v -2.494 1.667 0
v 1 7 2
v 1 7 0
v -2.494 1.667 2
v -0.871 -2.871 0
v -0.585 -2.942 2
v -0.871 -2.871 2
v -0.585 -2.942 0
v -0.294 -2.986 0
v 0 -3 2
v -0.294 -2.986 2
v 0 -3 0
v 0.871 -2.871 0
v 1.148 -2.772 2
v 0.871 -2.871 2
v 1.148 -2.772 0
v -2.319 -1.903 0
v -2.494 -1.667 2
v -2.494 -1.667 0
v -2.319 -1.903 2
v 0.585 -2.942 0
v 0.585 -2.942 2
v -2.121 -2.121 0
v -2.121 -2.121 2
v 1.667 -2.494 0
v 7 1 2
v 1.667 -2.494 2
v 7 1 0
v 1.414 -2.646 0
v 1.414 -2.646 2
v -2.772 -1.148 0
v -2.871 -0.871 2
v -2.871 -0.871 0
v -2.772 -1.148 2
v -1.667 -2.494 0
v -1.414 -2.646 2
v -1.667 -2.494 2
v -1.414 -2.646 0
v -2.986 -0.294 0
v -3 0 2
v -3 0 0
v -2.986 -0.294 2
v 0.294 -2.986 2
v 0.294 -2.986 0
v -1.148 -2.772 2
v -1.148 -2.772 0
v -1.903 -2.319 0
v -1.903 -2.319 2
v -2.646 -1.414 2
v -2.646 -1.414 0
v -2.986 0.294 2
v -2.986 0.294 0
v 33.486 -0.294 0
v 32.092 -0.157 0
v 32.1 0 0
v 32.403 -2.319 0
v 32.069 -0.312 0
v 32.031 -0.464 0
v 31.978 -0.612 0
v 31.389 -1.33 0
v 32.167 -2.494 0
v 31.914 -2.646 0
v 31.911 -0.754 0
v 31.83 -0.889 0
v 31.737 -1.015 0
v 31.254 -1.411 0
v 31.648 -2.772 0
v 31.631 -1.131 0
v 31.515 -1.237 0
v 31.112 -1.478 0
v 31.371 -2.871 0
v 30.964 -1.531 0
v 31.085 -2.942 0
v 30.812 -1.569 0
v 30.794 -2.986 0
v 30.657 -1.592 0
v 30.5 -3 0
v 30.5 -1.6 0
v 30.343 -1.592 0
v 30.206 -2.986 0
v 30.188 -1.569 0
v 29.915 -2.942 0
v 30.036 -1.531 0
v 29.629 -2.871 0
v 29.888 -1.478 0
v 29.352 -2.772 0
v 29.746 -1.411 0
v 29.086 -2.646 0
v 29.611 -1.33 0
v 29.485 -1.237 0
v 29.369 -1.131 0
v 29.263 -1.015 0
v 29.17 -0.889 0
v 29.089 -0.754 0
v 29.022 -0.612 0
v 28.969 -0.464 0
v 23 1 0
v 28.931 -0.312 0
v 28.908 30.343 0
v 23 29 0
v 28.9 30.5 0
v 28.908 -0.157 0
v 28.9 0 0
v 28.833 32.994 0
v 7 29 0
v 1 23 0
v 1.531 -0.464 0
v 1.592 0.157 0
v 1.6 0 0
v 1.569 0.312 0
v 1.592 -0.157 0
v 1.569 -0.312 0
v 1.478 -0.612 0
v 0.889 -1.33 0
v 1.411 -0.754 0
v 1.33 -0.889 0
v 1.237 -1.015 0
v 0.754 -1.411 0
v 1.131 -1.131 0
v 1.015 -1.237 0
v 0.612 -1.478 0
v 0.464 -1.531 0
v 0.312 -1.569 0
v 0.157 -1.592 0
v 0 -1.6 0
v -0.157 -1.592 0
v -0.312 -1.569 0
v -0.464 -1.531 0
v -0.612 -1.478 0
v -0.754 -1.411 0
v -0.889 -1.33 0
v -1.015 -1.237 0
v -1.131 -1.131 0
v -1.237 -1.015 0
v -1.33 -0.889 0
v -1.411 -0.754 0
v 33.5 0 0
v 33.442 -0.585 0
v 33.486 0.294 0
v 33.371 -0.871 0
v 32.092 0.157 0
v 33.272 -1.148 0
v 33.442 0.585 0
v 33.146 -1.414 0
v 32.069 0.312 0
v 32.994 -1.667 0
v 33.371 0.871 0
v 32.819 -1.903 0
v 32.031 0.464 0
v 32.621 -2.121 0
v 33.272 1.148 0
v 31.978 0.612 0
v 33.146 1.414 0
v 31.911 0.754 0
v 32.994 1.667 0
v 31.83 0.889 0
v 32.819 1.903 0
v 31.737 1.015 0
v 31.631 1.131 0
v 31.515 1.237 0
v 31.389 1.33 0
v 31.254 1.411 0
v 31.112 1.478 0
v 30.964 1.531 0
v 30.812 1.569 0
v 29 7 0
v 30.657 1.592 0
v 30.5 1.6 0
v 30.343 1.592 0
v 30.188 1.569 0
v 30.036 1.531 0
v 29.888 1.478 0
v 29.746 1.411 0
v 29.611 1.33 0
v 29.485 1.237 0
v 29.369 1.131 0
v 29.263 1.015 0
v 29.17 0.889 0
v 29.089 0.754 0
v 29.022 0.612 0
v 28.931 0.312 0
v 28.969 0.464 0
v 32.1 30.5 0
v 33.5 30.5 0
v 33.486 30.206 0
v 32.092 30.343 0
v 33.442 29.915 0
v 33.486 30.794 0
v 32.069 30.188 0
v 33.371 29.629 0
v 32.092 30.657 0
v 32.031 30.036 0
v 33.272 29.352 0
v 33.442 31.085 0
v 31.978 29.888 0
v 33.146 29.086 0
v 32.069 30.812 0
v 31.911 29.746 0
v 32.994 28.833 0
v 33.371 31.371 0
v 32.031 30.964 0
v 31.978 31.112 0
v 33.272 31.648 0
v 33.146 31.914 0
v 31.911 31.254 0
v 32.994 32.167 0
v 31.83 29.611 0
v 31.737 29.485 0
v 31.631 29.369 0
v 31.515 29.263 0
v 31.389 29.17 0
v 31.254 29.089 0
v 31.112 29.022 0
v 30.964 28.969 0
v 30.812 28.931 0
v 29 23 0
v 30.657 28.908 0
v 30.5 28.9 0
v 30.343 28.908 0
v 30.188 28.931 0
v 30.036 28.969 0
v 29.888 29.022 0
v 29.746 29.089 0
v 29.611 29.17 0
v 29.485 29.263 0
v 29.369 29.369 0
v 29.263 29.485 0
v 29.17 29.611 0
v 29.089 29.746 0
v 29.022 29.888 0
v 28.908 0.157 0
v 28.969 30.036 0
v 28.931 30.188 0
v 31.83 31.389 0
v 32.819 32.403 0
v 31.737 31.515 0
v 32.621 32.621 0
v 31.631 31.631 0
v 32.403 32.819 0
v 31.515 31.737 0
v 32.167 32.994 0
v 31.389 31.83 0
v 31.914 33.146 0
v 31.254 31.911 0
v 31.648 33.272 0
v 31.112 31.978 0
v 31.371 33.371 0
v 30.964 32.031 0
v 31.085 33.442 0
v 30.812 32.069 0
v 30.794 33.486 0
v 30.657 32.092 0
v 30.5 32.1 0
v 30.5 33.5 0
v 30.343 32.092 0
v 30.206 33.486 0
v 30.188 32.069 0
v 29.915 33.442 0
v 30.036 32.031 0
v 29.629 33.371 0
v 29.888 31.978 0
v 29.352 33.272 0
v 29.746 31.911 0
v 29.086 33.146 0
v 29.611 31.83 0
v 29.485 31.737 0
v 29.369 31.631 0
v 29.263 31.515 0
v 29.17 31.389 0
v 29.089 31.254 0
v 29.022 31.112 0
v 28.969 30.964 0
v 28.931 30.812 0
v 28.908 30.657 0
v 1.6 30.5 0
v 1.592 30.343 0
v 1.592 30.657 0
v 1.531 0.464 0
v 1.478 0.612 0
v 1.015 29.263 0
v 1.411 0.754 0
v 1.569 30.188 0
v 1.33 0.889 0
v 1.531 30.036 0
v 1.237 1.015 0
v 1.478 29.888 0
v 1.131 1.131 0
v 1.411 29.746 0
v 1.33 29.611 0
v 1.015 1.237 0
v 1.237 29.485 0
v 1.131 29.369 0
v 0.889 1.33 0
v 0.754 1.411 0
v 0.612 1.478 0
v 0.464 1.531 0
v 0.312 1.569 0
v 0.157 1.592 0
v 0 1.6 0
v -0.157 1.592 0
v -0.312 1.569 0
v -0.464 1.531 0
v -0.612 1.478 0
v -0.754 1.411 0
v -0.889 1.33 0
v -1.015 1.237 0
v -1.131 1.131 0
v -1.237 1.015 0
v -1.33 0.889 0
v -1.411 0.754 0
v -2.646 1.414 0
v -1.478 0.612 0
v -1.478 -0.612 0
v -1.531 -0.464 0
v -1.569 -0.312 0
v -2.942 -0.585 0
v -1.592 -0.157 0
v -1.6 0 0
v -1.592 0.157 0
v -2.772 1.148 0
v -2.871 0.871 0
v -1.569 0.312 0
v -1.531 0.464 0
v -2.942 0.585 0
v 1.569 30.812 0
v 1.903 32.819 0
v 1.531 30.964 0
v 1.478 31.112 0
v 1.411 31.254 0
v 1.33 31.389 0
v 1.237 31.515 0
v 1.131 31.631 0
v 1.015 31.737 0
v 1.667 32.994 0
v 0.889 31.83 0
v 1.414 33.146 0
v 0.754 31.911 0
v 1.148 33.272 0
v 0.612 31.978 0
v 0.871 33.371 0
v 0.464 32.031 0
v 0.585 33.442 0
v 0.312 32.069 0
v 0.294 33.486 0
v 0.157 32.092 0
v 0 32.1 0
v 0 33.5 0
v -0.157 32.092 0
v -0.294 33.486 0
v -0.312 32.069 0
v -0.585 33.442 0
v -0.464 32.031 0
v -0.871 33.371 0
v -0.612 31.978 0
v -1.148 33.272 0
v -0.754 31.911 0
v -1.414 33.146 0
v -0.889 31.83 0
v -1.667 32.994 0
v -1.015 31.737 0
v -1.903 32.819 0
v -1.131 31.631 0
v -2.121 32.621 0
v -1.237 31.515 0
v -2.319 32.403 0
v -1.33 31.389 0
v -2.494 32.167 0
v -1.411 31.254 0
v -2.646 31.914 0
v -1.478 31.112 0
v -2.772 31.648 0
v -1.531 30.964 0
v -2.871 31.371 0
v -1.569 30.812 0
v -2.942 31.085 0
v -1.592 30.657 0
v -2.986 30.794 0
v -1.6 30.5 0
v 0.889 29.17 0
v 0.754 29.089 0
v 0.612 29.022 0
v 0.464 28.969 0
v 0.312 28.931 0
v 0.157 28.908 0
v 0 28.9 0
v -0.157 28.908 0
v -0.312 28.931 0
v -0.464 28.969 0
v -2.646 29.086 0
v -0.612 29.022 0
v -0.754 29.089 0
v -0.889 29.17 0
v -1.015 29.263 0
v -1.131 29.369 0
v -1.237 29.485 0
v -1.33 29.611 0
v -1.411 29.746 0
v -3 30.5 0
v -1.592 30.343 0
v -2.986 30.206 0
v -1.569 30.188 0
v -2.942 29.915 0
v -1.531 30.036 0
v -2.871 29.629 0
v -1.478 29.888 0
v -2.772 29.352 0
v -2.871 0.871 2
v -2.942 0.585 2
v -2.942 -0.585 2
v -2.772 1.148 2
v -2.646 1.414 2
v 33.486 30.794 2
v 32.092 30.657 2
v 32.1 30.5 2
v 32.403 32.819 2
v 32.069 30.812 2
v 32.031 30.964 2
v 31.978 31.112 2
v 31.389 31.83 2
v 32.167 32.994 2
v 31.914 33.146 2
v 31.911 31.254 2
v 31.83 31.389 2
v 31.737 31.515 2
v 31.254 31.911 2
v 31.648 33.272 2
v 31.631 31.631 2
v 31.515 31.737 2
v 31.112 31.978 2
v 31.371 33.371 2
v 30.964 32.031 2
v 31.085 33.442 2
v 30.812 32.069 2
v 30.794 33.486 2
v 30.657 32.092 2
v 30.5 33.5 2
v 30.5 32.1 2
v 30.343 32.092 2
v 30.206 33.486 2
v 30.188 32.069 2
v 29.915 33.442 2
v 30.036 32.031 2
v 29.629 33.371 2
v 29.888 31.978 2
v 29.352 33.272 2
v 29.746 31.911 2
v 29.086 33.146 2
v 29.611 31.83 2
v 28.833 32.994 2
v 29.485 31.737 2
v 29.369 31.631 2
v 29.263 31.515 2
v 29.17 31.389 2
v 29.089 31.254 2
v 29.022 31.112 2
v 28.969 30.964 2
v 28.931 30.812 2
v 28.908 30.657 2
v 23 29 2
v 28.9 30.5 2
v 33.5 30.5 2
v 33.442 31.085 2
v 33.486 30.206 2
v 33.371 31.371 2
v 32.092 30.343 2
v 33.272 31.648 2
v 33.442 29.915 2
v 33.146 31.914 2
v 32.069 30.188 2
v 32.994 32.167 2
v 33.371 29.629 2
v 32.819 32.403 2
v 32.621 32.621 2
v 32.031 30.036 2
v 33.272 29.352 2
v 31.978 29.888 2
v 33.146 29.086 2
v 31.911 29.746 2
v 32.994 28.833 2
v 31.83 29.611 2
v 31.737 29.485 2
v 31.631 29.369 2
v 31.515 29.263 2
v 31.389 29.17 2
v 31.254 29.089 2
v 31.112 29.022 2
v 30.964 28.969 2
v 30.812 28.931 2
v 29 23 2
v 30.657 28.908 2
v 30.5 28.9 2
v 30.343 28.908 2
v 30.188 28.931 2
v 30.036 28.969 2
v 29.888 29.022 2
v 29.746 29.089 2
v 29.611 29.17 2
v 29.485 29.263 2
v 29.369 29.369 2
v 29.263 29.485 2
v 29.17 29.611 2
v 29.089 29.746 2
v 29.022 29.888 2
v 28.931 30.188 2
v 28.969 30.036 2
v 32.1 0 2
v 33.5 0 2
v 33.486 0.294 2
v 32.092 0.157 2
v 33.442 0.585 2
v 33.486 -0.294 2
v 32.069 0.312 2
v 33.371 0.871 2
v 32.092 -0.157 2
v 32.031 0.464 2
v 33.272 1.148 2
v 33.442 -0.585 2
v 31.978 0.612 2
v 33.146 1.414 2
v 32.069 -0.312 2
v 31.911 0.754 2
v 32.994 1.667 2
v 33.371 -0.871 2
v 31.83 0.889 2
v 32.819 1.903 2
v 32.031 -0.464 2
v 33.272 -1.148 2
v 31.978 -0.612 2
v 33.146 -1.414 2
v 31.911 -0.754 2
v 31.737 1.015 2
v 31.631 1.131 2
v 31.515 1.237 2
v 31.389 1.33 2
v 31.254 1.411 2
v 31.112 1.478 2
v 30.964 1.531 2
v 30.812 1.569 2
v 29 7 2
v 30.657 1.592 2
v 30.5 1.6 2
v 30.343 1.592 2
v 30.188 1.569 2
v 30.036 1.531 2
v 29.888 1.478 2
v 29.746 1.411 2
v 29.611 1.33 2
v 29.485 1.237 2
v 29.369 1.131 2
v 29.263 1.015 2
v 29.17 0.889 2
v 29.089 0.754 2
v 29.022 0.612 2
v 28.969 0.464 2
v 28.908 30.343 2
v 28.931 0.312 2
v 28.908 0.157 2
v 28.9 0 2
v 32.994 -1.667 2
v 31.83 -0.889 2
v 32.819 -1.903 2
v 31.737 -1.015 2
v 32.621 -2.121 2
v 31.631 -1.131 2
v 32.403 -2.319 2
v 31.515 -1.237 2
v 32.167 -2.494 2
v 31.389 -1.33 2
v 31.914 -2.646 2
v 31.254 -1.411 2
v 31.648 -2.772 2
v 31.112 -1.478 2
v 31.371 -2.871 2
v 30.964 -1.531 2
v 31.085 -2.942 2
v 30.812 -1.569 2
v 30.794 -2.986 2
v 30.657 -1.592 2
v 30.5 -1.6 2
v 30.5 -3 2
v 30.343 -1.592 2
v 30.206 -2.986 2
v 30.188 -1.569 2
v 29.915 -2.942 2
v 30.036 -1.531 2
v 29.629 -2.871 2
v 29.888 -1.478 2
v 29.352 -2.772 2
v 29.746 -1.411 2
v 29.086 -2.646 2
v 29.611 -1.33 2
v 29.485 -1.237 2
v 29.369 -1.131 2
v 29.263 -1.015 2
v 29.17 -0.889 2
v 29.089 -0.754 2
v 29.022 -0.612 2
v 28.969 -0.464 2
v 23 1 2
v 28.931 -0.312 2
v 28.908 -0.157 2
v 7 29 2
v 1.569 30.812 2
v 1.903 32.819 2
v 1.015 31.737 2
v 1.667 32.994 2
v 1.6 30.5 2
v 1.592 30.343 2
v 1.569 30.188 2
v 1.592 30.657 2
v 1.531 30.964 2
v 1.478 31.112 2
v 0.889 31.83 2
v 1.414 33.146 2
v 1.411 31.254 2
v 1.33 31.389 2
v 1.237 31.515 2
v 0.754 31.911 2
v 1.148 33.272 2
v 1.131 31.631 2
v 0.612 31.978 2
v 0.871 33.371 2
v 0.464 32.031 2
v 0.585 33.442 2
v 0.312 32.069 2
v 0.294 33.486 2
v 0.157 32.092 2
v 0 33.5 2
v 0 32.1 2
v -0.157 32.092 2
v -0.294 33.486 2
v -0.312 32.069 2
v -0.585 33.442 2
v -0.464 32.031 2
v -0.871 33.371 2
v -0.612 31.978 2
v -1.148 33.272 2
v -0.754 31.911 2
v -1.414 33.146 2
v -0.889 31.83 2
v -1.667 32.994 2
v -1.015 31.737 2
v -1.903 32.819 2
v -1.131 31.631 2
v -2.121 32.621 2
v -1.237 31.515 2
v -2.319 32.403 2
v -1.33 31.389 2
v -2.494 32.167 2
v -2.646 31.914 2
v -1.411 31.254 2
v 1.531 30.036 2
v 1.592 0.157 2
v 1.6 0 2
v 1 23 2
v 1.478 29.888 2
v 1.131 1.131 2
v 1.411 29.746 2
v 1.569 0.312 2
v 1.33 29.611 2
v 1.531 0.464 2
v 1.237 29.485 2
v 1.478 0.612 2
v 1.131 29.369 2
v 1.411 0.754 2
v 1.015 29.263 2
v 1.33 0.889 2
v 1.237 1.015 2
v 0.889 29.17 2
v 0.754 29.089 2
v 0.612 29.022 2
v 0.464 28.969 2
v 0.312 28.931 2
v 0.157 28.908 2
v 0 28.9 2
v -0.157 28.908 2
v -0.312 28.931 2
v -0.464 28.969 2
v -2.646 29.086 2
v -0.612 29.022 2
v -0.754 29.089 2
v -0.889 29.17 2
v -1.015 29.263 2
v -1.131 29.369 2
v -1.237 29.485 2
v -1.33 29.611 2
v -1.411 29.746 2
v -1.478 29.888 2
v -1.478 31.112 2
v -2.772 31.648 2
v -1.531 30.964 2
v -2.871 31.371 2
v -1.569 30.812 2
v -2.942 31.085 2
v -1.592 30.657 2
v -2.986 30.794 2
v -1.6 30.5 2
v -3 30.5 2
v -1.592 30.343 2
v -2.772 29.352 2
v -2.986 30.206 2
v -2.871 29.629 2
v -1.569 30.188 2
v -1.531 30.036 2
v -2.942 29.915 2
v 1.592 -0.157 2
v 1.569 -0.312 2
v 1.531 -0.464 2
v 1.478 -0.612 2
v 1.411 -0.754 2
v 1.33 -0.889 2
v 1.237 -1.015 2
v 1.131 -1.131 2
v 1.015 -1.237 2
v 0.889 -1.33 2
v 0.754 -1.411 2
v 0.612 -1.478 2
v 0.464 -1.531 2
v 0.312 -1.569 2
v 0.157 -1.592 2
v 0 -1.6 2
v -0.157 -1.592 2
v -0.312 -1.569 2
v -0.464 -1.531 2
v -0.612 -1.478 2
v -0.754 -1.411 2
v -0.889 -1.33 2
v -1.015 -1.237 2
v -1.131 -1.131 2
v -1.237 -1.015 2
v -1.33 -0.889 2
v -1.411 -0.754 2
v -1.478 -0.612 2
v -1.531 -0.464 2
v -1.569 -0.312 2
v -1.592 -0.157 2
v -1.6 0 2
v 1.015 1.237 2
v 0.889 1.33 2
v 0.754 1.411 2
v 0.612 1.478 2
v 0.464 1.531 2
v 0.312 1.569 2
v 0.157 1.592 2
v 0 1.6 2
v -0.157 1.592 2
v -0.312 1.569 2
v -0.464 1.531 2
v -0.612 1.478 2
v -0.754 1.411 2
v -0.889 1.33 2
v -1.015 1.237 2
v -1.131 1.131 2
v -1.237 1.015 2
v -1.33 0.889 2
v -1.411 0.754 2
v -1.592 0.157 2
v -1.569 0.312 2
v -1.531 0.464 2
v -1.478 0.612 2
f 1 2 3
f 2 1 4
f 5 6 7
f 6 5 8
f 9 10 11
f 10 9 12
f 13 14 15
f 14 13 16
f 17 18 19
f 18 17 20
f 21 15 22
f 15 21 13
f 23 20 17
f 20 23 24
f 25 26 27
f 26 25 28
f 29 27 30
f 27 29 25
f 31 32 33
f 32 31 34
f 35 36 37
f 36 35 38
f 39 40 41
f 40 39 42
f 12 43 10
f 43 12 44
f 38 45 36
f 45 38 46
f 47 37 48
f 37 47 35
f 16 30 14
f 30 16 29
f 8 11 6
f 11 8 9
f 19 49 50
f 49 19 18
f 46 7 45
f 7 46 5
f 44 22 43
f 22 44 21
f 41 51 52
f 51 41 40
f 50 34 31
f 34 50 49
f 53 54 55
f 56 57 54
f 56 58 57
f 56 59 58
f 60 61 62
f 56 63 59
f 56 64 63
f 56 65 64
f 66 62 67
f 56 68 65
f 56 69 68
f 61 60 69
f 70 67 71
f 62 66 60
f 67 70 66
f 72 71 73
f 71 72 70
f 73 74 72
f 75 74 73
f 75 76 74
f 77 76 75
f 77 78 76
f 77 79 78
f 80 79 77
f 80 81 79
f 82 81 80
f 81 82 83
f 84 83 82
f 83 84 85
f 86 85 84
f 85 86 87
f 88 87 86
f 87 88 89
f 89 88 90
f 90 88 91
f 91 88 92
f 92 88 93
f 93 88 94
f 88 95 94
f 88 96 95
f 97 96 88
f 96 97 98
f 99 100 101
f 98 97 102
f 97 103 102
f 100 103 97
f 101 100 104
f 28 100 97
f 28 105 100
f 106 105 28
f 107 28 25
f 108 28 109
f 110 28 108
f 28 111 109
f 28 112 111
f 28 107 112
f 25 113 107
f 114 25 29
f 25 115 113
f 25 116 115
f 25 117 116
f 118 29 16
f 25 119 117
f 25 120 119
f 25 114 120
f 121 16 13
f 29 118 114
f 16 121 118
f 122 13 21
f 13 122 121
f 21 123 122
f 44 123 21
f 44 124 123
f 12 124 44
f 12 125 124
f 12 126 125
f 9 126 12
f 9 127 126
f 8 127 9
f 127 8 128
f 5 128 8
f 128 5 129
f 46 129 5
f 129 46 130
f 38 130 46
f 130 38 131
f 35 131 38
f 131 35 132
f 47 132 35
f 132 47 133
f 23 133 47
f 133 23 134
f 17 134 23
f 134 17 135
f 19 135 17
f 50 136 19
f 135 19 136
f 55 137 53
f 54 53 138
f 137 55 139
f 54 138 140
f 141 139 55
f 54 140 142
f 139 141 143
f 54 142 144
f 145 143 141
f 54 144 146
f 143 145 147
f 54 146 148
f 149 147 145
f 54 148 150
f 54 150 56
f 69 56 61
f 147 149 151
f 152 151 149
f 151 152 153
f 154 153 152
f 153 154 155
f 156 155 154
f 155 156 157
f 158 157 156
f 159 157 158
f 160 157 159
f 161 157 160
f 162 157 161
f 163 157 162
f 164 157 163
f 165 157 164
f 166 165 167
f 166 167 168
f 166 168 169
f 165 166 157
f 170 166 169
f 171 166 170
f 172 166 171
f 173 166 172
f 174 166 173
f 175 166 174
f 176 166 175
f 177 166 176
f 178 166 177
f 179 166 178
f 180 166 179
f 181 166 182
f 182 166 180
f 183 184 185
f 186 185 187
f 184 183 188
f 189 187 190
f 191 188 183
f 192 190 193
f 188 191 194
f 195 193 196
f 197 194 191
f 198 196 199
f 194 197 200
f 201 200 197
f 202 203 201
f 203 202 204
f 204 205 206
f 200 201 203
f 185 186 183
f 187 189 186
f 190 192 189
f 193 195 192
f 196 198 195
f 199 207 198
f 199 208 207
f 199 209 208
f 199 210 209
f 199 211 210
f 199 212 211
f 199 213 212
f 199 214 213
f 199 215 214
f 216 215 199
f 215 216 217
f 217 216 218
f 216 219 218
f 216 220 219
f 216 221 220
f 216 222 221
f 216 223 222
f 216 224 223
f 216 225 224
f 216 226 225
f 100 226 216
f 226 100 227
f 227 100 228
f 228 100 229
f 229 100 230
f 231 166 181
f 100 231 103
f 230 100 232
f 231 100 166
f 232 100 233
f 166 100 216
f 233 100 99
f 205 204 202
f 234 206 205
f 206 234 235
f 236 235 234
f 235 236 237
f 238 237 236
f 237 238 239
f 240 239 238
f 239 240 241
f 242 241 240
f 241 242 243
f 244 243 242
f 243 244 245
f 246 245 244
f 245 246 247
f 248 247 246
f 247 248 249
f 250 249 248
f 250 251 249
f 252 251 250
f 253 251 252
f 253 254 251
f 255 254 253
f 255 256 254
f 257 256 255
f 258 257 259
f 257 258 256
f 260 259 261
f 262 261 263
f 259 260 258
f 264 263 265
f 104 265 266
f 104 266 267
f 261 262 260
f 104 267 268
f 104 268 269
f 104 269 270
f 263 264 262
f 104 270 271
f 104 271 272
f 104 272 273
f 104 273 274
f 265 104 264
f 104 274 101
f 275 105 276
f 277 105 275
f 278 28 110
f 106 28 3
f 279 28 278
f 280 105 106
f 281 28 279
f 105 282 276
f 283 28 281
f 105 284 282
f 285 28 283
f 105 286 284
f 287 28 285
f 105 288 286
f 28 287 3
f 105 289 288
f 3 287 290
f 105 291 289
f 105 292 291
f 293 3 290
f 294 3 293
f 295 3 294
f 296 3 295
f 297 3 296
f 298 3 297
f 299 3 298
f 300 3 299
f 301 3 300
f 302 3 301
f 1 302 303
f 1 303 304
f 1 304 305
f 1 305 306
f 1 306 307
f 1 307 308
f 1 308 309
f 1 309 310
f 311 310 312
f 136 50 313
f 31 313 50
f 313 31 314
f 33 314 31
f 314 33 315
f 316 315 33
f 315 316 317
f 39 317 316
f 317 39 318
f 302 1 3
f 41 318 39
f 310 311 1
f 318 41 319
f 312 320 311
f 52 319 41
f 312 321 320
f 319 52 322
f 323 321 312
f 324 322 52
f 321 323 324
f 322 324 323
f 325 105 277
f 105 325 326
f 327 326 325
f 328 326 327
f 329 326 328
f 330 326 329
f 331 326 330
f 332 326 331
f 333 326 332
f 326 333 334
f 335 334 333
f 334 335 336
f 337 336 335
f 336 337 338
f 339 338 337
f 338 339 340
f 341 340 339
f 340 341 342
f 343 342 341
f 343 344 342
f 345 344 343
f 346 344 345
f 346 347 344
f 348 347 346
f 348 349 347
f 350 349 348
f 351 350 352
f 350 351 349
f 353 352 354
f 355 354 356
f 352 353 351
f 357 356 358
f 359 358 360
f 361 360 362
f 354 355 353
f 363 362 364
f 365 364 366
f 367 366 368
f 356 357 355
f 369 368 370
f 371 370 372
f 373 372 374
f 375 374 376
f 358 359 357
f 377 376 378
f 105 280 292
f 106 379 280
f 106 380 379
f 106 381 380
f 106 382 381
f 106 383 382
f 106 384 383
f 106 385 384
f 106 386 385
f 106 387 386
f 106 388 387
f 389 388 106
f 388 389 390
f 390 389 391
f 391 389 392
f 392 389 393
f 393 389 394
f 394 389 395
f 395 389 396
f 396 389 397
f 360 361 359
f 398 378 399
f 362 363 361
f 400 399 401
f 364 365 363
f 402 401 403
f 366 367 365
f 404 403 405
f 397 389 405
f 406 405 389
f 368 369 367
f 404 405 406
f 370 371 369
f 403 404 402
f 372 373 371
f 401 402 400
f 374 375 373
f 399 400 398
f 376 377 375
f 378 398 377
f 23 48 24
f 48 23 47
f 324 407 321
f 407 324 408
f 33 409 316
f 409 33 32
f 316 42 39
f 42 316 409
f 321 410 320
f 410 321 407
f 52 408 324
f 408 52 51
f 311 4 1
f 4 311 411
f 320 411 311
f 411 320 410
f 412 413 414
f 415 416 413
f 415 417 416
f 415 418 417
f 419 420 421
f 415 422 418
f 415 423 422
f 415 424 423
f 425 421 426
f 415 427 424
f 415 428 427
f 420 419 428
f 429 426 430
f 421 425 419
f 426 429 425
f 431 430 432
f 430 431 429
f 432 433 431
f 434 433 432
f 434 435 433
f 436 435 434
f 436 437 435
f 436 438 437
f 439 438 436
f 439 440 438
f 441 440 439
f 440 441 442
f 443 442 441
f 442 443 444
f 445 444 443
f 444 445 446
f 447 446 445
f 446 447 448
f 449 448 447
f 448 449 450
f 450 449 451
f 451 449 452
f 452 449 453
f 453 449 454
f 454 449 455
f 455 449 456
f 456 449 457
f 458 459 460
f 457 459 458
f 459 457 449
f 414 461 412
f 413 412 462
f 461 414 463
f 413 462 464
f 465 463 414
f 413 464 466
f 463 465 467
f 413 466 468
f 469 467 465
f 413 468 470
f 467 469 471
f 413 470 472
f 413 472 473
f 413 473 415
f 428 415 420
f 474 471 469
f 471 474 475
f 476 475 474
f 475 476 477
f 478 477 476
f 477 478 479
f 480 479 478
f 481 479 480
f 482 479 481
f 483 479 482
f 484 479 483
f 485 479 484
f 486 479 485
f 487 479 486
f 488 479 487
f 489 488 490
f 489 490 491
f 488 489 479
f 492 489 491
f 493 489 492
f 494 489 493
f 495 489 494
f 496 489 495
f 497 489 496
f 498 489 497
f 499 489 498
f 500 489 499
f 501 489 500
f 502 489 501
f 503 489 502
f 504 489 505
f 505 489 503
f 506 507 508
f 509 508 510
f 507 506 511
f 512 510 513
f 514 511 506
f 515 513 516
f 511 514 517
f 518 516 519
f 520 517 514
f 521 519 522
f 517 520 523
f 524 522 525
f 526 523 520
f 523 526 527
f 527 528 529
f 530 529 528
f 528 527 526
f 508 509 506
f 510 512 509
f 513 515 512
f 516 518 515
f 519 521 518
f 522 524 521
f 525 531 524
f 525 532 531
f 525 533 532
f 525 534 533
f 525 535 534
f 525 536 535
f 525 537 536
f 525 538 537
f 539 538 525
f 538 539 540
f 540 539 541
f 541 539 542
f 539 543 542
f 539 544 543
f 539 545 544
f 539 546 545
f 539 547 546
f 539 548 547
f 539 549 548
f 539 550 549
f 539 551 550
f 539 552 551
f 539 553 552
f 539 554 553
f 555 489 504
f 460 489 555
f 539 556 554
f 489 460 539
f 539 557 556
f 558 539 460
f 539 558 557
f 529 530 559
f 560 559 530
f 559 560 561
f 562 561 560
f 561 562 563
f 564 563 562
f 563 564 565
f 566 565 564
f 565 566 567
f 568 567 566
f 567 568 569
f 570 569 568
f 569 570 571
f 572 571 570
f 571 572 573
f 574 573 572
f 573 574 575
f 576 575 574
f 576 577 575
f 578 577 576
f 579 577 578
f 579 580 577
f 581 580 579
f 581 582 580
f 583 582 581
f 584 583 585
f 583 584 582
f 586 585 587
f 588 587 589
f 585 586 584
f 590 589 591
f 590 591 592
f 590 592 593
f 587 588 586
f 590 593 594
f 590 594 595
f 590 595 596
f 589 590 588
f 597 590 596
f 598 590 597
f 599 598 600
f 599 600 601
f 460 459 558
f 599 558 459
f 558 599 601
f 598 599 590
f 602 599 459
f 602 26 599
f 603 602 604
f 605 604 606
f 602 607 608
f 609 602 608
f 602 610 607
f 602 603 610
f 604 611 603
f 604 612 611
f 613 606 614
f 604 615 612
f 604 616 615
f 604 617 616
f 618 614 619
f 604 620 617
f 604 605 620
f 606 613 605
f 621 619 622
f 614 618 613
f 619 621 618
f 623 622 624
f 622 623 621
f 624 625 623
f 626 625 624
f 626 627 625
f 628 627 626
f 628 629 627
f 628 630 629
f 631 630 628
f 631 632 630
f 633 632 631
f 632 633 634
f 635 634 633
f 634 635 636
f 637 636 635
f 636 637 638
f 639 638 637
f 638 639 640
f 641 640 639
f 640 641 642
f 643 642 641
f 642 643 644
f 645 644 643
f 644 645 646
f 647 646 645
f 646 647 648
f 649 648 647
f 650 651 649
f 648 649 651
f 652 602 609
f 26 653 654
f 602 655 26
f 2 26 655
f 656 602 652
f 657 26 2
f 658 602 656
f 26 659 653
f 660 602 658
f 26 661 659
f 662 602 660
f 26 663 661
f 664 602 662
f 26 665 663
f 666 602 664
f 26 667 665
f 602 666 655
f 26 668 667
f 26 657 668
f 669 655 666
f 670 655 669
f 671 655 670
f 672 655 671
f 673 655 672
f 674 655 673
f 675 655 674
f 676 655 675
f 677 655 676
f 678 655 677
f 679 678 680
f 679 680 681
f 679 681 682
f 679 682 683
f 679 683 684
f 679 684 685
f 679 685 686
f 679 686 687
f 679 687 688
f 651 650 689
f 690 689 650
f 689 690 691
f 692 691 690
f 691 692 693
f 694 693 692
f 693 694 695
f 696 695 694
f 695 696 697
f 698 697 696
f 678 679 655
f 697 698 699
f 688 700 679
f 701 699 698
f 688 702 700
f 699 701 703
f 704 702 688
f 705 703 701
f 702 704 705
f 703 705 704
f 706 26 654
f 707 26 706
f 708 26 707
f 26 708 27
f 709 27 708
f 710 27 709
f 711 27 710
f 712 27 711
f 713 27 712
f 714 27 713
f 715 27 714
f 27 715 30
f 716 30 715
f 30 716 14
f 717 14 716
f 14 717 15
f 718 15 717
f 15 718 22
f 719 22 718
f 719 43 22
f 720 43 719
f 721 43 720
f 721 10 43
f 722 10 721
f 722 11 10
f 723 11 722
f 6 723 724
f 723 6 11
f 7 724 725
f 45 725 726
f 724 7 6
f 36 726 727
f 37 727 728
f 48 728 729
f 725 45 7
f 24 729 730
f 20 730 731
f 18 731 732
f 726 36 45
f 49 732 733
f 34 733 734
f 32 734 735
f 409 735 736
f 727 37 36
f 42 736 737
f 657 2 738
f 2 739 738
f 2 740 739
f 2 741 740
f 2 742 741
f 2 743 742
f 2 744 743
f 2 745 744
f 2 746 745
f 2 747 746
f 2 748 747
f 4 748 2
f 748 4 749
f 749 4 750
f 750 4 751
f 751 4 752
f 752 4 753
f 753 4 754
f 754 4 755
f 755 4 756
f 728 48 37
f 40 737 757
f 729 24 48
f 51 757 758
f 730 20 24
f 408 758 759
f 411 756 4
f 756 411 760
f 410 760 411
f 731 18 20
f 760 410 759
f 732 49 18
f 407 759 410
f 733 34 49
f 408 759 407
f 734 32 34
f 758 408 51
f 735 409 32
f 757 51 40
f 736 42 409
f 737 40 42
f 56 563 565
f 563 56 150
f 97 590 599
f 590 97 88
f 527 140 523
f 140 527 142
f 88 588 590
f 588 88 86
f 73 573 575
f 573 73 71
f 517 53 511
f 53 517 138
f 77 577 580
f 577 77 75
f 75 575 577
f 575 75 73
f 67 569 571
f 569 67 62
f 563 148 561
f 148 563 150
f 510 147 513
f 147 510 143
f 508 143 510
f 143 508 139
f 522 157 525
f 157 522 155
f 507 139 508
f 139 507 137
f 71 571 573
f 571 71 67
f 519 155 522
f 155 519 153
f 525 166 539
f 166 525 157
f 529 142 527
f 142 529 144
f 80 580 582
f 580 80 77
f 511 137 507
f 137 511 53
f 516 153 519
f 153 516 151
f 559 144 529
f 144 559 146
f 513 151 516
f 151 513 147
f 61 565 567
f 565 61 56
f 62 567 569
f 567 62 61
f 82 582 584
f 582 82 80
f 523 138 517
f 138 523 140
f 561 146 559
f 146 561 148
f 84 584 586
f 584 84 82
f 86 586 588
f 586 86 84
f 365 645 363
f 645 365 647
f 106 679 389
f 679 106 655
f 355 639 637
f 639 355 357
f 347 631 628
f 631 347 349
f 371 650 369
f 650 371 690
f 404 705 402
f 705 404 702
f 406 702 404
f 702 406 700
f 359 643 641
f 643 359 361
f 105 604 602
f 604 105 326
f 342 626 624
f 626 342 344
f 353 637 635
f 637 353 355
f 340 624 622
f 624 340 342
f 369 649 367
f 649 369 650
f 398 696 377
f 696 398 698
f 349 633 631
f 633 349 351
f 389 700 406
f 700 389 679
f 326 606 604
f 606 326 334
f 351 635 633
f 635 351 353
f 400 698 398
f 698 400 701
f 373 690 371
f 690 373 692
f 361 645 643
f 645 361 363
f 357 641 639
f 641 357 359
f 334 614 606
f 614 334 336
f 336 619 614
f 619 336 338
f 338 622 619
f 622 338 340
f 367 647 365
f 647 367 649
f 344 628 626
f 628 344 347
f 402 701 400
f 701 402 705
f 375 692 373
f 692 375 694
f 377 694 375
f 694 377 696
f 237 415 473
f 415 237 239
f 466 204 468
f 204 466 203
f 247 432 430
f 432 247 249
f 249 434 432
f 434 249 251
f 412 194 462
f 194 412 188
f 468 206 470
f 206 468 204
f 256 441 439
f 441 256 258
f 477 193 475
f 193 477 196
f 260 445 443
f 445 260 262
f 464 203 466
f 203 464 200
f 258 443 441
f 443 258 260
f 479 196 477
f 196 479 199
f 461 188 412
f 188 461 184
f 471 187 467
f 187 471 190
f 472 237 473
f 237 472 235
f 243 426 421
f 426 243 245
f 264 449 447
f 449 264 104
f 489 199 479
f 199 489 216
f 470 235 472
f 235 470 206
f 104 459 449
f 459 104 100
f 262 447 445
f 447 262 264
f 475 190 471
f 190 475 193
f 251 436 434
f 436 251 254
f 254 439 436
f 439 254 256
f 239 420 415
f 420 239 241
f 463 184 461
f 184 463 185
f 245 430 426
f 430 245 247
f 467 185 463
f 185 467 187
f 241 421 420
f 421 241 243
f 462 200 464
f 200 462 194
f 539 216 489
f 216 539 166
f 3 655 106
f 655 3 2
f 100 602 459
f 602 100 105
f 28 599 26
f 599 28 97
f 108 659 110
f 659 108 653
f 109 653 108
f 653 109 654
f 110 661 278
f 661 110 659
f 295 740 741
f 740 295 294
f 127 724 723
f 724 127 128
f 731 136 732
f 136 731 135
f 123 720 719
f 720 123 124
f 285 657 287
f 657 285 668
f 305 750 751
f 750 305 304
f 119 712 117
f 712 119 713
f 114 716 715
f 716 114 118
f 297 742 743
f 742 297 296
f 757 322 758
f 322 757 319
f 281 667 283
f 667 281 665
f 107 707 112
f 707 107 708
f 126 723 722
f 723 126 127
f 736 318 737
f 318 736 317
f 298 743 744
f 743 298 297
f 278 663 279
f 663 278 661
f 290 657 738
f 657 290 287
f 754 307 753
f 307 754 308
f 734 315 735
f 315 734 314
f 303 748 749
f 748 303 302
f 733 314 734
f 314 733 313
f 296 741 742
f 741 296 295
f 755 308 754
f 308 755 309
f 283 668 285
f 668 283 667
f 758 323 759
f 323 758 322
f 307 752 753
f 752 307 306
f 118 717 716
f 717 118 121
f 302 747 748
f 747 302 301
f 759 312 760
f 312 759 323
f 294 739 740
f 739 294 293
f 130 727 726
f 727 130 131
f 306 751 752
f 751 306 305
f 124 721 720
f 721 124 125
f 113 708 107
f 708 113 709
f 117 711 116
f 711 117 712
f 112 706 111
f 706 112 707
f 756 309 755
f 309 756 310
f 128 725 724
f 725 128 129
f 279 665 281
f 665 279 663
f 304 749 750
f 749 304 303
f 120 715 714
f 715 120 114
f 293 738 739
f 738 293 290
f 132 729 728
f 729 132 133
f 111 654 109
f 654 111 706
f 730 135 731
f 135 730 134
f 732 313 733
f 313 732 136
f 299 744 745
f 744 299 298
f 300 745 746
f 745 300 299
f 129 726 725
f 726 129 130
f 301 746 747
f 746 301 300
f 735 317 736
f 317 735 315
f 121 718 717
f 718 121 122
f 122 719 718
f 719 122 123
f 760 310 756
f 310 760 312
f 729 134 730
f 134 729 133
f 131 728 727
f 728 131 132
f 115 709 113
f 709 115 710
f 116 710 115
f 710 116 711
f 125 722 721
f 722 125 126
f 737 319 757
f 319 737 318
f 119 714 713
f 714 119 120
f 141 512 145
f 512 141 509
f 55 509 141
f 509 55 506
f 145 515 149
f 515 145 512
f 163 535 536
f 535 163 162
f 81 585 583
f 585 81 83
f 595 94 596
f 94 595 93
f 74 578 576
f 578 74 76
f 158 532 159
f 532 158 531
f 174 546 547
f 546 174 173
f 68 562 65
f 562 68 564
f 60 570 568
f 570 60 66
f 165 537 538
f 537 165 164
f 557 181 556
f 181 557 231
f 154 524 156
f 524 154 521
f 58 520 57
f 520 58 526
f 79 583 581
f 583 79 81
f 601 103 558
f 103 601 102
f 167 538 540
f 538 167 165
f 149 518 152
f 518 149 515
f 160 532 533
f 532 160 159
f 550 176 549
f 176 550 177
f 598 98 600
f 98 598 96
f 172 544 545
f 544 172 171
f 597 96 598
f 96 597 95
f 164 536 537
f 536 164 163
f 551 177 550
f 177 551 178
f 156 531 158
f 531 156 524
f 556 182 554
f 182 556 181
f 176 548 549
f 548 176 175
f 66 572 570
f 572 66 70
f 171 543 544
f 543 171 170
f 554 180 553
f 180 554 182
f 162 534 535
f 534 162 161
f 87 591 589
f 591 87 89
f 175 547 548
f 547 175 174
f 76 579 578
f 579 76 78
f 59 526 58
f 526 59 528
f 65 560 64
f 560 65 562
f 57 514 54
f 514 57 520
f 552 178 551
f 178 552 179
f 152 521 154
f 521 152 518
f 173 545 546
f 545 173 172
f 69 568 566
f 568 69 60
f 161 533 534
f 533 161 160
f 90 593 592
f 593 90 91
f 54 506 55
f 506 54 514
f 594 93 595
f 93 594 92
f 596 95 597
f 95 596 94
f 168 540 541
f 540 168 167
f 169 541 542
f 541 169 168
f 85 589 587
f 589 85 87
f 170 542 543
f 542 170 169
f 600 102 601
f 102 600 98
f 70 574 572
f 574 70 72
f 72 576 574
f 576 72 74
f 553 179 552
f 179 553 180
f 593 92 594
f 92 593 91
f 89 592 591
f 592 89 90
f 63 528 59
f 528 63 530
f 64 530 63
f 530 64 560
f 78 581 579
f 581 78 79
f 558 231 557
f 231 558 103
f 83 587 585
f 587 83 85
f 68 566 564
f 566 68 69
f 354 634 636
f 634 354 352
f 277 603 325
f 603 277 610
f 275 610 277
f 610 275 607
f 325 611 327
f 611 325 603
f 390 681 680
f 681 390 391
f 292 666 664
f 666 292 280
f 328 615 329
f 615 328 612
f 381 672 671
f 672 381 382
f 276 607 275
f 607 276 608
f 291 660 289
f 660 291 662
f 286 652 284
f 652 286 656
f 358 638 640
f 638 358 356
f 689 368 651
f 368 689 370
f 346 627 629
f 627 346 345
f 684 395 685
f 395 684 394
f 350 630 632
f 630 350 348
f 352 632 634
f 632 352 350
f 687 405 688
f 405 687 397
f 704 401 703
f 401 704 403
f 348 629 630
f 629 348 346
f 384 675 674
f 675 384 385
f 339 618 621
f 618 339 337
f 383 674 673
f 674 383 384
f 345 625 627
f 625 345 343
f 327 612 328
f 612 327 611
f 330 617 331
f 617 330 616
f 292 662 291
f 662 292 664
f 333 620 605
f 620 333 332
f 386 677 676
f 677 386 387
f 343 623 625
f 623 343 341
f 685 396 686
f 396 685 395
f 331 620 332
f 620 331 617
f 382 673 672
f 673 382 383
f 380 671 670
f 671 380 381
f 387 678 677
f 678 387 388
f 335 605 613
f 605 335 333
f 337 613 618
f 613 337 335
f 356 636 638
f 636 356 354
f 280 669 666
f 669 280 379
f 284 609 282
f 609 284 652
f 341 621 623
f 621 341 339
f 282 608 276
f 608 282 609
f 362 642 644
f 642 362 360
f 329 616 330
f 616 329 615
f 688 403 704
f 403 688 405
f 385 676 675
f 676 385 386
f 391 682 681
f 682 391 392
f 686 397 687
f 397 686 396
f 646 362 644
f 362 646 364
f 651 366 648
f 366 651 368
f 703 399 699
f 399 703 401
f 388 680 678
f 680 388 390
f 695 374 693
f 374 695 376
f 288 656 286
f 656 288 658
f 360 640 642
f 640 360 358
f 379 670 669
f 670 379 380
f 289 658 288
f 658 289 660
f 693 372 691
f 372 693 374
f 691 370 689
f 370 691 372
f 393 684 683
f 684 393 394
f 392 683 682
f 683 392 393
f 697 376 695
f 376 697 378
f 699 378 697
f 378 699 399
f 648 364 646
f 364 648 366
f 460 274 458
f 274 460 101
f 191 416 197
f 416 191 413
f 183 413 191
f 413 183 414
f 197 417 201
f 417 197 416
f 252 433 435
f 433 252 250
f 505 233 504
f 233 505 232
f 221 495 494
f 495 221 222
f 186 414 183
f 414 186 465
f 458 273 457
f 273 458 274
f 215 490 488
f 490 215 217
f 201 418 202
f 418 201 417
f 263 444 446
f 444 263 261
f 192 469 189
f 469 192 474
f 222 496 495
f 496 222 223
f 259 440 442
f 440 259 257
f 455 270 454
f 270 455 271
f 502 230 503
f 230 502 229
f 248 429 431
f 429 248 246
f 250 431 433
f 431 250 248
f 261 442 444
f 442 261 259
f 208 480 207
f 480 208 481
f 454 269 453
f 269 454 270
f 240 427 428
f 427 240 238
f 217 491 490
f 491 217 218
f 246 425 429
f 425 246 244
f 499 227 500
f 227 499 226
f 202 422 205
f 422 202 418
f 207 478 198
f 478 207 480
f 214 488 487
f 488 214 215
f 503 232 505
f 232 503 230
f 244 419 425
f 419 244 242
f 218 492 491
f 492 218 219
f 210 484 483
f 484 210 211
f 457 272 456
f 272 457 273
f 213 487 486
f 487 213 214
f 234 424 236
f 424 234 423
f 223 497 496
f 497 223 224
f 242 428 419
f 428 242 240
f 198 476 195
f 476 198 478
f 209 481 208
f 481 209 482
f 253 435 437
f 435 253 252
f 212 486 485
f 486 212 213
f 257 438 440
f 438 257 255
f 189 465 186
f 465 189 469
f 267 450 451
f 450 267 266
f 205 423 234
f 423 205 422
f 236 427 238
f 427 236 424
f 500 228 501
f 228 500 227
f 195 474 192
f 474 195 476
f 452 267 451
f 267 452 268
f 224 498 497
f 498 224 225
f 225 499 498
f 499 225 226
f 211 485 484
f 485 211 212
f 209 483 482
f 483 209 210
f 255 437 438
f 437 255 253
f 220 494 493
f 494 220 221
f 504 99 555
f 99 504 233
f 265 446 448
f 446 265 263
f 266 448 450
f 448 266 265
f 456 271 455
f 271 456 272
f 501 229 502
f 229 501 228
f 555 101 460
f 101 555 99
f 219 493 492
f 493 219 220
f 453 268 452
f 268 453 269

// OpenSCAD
$fn = 64;

baseHeight = 2;

module basePlate() {
    difference() {
        union() {
            // mounting posts
            hull() {
                translate([0, 0, 0]) cylinder(d = 6, h = baseHeight);
                translate([1, 1, 0]) cube([6, 6, baseHeight]);

            }
            hull() {
                translate([30.5, 0, 0]) cylinder(d = 6, h = baseHeight);
                translate([23, 1, 0]) cube([6, 6, baseHeight]);
            }
            
            hull() {
                translate([0, 30.5, 0]) cylinder(d = 6, h = baseHeight);
                translate([1, 23, 0]) cube([6, 6, baseHeight]);
            }
            
            hull() {
                translate([30.5, 30.5, 0]) cylinder(d = 6, h = baseHeight);
                translate([23, 23, 0]) cube([6, 6, baseHeight]);
            }
            
            // base plate
            translate([1, 1, 0]) cube([28, 28, baseHeight]);
        }
        translate([0, 0, -0.1]) cylinder(d = 3.2, h = baseHeight + 0.2);
        translate([30.5, 0, -0.1]) cylinder(d = 3.2, h = baseHeight + 0.2);
        translate([0, 30.5, -0.1]) cylinder(d = 3.2, h = baseHeight + 0.2);
        translate([30.5, 30.5, -0.1]) cylinder(d = 3.2, h = baseHeight + 0.2);
    }
}

basePlate();
